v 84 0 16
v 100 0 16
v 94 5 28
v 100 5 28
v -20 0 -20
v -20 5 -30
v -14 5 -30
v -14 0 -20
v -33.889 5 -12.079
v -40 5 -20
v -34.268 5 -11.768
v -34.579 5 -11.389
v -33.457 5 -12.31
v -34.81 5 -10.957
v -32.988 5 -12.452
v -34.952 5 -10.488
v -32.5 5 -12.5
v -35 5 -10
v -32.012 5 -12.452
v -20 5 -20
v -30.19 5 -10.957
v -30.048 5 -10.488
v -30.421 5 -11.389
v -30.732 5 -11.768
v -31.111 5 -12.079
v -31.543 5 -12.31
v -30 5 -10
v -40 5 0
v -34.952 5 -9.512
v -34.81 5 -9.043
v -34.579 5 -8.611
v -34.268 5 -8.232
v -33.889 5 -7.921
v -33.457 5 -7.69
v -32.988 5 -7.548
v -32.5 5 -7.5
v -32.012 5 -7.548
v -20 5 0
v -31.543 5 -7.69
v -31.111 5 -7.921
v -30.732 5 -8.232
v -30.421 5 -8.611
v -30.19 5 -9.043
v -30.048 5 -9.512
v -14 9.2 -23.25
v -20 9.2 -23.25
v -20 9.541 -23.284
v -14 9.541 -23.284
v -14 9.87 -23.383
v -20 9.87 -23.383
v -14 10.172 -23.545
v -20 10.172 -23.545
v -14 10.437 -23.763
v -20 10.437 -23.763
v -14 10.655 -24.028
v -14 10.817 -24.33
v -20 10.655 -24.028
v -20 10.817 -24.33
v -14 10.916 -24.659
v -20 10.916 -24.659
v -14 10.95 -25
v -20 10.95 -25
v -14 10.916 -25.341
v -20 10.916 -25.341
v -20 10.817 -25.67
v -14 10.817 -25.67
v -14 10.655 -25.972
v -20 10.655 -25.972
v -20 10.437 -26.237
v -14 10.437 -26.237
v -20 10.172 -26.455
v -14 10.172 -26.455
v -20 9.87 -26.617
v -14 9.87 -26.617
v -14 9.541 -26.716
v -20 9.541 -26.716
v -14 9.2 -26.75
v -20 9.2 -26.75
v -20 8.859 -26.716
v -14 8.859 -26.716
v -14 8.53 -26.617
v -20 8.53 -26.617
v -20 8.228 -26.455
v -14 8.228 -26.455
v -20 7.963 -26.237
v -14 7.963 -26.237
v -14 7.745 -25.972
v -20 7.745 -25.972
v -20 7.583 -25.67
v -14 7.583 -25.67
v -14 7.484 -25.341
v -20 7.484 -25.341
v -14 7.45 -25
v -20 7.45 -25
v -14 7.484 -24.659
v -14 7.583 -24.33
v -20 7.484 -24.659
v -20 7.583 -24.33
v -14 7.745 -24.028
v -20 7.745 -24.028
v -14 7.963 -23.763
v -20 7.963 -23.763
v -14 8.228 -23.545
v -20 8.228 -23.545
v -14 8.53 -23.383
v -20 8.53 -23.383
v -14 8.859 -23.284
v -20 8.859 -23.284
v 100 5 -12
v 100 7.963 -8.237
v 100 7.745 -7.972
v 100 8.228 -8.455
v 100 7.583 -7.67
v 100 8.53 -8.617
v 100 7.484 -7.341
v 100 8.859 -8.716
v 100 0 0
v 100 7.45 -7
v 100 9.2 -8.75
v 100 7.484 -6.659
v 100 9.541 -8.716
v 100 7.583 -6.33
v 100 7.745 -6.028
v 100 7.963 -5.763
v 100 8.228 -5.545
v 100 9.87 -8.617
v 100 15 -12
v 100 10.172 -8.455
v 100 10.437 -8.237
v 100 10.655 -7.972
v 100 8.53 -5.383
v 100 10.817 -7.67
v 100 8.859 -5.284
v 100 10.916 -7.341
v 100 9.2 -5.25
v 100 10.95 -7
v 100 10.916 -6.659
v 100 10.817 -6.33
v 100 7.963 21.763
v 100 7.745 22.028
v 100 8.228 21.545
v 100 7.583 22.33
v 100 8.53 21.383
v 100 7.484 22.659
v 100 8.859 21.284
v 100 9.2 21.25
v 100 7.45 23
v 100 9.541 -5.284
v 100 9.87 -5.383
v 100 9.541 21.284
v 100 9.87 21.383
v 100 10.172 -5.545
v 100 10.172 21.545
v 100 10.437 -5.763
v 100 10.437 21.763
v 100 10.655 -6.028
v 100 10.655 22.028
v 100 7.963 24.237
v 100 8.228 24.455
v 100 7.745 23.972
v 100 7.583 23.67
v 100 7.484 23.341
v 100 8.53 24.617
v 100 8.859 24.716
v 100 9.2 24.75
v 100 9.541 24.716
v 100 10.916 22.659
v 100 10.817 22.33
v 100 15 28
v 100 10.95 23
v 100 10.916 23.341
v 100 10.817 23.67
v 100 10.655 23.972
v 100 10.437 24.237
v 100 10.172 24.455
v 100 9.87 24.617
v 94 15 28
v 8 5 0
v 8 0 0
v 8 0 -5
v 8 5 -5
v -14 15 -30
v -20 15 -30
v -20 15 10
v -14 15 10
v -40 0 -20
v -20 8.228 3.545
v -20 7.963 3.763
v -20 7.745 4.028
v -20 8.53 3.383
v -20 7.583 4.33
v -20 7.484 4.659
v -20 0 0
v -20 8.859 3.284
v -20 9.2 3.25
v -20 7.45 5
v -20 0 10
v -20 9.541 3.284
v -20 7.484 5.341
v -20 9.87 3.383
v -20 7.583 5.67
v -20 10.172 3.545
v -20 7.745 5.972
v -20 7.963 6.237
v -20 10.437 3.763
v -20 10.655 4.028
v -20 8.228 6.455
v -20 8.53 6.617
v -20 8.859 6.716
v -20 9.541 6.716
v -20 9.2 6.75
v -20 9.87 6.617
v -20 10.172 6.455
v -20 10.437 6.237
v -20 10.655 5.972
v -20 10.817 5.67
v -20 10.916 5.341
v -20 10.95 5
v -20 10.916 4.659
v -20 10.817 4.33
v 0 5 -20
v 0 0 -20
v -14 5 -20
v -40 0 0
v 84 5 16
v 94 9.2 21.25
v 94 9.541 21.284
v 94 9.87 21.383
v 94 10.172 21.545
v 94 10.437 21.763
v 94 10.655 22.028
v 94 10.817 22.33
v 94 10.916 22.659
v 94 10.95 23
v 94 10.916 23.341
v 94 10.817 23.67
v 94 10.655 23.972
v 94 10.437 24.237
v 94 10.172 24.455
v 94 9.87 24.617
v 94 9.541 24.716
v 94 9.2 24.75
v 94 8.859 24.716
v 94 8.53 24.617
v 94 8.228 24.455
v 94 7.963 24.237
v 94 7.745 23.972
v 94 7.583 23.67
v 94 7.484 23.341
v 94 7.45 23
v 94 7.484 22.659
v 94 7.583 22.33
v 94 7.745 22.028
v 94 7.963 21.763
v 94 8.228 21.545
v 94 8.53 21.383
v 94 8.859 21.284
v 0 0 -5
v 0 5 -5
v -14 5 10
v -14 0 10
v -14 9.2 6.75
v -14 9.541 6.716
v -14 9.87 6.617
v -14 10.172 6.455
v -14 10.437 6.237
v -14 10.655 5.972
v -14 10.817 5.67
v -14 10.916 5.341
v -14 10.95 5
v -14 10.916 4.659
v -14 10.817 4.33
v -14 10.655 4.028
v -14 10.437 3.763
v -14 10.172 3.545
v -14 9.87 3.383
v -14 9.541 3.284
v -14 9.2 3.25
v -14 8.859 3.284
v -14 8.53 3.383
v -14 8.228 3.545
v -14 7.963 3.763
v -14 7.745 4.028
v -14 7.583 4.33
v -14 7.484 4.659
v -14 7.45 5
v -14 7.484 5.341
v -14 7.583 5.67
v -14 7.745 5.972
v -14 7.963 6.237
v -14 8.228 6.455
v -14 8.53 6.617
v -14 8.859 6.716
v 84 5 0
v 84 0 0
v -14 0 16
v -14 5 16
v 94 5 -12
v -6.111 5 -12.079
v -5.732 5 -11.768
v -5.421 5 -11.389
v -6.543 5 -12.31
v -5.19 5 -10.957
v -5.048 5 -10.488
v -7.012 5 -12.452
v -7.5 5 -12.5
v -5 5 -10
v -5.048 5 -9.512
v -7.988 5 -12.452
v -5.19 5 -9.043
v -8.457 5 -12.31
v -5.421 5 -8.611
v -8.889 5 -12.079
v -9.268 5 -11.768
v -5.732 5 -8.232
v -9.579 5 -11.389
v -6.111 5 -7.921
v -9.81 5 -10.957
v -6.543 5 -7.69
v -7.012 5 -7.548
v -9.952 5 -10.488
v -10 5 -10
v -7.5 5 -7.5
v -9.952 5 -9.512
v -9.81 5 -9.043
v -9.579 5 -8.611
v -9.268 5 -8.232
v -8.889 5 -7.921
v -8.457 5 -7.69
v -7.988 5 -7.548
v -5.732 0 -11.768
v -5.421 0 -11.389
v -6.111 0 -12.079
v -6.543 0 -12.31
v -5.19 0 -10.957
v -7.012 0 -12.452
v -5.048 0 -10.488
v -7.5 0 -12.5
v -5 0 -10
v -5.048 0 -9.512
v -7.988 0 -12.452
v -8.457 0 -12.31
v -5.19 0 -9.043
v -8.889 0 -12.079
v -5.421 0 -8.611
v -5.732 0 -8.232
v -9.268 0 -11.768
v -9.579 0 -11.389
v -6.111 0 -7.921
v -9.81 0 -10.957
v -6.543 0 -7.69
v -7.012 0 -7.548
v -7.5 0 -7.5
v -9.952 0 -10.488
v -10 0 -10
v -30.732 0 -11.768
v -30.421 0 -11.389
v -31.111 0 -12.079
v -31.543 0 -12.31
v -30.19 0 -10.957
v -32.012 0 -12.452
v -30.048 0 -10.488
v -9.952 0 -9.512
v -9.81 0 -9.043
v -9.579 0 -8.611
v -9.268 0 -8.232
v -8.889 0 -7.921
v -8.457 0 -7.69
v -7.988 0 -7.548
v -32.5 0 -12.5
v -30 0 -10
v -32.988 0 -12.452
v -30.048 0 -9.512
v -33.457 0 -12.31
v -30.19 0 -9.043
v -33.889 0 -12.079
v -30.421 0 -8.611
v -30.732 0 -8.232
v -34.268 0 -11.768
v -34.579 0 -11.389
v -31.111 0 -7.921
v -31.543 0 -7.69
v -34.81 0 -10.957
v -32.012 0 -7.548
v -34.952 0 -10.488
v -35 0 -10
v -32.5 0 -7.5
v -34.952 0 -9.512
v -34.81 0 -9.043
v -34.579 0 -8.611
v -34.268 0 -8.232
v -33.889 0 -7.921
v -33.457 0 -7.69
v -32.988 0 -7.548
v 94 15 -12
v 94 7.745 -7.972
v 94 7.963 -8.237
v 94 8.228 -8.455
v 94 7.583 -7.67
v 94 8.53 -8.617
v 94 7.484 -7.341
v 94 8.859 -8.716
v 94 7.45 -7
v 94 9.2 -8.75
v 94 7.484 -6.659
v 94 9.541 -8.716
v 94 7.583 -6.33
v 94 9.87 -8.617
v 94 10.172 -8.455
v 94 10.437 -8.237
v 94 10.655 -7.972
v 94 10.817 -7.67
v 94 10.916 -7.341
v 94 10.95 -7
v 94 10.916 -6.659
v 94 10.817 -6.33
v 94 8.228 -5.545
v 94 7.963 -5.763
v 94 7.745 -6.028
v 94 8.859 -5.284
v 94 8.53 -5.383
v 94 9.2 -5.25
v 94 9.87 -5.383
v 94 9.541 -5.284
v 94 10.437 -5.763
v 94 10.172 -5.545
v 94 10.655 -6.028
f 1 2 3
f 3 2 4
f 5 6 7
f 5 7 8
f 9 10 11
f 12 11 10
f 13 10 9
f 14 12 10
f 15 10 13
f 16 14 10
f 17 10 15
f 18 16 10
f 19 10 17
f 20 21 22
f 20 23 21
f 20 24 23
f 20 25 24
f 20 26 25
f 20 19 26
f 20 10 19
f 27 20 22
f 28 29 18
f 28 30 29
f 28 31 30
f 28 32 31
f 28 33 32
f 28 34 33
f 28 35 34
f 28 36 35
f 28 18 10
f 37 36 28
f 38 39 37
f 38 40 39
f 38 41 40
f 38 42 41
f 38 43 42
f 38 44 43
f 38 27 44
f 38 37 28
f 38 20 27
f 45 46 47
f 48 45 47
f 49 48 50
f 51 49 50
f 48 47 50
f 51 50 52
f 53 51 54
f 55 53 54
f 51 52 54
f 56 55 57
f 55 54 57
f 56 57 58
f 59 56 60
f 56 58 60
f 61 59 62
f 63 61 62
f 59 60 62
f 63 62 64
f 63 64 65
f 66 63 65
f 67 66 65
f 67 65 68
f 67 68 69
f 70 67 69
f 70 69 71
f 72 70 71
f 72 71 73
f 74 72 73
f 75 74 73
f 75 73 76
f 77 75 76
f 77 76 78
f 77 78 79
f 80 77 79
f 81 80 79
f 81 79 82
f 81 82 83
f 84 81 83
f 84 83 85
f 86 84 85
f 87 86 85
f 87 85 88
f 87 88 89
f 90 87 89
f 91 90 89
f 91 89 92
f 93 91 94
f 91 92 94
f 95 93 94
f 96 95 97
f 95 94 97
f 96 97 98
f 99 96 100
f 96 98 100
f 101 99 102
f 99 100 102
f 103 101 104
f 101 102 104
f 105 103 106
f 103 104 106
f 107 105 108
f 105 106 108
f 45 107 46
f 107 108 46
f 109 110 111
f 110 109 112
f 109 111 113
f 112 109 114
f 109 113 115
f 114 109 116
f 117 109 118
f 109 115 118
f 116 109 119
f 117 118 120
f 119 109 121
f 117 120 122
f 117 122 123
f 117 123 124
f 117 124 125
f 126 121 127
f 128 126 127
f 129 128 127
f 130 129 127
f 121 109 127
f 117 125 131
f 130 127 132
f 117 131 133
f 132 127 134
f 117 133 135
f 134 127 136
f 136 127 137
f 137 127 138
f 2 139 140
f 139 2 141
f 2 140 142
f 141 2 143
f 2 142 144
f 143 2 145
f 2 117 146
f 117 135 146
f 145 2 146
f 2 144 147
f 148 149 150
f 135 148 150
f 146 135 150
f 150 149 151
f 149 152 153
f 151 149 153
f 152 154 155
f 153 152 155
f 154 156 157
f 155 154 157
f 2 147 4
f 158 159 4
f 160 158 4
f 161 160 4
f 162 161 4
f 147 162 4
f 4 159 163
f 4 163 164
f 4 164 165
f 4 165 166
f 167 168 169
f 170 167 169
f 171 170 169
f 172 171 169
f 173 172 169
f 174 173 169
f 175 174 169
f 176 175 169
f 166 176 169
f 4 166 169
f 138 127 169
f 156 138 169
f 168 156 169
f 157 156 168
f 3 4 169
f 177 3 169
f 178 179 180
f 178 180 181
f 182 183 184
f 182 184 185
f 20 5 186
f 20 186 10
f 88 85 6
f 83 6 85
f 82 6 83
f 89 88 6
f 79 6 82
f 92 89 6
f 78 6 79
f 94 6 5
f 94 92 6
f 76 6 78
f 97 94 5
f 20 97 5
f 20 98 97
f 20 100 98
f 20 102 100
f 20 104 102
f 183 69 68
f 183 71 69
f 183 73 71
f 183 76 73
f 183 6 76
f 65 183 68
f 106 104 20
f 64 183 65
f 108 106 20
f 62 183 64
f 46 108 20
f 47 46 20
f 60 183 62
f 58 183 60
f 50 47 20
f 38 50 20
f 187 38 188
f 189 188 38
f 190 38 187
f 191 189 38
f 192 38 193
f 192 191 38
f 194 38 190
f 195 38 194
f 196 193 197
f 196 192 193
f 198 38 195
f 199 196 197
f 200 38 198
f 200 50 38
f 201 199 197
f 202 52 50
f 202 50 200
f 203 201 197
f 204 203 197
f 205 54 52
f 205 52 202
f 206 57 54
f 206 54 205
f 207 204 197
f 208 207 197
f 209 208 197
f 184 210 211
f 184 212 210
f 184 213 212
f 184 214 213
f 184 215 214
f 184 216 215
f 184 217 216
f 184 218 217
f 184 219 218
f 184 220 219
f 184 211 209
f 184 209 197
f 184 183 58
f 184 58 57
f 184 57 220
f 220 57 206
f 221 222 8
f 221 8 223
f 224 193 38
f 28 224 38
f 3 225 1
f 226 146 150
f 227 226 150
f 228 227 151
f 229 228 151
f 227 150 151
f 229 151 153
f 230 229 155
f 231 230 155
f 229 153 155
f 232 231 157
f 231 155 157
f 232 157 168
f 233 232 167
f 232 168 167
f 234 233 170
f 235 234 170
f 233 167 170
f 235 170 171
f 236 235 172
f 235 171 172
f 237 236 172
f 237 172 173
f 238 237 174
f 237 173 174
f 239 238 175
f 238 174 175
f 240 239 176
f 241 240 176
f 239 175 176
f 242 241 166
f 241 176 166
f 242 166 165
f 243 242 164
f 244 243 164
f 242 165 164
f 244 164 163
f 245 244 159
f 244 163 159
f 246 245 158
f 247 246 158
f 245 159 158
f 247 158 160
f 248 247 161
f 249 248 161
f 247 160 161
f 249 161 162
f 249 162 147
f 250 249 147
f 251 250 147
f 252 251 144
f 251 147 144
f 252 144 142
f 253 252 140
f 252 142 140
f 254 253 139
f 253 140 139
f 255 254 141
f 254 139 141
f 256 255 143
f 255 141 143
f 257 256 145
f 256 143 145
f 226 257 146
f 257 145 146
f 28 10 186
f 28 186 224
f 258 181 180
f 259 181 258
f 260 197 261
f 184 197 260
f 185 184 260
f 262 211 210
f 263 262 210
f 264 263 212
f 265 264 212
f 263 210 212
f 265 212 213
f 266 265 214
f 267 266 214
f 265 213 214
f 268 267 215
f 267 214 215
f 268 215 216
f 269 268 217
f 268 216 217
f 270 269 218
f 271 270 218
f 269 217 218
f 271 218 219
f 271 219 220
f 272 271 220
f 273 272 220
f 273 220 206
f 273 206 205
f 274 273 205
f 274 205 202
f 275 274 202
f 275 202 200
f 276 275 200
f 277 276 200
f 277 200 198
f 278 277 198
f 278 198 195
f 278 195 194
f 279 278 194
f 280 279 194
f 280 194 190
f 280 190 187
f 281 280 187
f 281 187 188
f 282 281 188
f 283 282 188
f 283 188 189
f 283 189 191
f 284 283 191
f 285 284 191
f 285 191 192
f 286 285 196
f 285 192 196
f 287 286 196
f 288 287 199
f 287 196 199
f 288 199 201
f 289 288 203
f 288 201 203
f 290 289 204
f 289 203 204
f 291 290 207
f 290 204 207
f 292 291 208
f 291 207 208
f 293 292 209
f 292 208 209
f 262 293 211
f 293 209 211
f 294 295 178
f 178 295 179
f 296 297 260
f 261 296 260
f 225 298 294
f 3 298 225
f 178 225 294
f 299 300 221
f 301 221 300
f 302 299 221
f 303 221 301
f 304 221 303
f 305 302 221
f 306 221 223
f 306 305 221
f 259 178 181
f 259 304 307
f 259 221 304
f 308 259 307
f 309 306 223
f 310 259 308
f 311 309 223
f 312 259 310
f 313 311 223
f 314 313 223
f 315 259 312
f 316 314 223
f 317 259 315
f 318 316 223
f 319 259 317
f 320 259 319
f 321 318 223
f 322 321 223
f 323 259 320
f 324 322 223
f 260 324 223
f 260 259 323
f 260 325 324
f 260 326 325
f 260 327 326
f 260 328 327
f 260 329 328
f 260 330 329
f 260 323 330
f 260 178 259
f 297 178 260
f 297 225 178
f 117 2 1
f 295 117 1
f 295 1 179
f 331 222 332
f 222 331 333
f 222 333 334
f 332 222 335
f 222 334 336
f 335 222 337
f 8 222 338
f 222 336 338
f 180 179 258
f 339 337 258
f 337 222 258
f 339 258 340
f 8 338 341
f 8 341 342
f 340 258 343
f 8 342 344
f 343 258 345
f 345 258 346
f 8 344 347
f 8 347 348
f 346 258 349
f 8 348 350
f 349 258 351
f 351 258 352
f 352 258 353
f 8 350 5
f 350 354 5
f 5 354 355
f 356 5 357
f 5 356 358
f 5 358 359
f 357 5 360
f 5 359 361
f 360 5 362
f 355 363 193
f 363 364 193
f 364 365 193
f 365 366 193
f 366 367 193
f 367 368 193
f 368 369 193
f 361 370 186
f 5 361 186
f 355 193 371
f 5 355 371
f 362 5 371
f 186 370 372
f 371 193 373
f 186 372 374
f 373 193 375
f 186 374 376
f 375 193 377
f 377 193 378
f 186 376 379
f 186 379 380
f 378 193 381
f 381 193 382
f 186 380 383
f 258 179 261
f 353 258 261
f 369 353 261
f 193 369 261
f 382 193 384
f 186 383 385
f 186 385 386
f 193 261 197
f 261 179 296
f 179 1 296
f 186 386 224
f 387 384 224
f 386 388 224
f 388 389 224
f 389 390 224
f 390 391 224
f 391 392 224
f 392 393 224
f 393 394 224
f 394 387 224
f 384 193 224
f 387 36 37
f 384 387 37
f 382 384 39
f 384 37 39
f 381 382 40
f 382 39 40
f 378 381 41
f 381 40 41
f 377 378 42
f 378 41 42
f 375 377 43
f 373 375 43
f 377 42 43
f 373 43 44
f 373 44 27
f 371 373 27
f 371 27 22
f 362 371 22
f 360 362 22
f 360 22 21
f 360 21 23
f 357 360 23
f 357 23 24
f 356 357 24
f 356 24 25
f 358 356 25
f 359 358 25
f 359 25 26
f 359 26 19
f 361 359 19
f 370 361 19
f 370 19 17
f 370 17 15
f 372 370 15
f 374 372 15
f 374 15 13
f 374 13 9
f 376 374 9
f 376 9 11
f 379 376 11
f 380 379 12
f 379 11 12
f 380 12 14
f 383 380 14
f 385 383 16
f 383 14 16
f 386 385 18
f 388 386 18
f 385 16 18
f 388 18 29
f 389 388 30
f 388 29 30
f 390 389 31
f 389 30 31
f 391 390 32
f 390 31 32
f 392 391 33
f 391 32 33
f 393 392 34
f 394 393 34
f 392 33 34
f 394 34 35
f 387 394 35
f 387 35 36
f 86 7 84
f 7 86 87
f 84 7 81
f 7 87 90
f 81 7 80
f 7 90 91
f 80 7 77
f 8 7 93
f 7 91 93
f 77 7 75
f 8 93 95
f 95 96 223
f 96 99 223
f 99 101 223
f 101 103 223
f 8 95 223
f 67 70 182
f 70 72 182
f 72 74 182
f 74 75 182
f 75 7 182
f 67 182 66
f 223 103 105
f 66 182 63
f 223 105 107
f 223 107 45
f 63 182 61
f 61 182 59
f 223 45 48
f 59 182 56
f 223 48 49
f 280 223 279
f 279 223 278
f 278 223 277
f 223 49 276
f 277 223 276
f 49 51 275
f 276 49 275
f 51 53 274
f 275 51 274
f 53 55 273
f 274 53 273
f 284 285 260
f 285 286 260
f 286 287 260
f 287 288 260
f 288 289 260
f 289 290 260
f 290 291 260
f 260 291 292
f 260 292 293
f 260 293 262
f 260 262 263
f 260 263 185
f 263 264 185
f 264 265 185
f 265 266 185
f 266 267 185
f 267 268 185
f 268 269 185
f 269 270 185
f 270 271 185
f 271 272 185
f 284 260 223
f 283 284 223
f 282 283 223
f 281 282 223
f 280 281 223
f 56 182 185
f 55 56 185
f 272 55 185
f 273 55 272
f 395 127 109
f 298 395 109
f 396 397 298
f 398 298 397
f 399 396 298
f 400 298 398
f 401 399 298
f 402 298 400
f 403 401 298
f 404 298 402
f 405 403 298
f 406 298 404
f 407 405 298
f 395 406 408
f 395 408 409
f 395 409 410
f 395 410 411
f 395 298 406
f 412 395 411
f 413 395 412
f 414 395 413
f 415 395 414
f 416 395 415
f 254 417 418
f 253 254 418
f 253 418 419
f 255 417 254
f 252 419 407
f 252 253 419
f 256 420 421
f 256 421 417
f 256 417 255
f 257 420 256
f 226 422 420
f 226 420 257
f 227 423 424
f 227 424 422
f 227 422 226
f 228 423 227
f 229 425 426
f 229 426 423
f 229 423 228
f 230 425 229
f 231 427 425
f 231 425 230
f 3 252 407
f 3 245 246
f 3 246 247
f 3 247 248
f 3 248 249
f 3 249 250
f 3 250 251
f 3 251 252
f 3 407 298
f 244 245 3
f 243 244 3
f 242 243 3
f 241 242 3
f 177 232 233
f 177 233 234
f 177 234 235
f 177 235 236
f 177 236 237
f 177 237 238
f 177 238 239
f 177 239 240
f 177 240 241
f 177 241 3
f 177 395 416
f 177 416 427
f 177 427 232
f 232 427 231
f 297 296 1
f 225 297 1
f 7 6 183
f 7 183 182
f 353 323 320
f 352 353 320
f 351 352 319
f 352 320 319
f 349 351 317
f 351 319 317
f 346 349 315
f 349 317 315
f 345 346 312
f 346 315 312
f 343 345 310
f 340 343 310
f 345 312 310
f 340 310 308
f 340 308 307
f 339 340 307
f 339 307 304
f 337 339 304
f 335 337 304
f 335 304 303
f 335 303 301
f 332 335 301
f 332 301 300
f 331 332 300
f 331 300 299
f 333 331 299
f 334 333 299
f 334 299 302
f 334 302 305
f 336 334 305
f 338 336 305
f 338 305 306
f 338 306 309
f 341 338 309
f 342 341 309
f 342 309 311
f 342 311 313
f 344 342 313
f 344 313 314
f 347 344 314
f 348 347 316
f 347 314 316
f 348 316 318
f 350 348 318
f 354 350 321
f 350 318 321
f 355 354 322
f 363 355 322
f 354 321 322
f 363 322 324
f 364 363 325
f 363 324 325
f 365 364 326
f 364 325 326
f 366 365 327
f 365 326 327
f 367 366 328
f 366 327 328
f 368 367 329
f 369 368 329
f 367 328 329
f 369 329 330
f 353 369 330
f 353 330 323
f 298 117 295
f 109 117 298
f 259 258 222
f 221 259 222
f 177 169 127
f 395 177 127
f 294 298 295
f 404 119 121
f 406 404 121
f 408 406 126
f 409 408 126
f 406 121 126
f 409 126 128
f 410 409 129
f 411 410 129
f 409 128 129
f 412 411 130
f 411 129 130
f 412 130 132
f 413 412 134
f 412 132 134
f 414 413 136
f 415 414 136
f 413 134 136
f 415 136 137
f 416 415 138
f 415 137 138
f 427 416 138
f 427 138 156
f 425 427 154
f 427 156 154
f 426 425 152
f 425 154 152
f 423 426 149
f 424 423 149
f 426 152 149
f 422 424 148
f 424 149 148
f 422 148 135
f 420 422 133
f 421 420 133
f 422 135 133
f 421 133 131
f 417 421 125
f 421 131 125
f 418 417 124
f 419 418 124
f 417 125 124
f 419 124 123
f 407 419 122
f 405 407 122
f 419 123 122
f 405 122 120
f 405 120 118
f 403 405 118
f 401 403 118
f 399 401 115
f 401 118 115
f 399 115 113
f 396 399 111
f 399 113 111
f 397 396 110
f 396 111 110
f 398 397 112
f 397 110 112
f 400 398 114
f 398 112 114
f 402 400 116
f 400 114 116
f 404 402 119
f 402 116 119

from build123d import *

# Parameters (mm, degrees)
EXTRUDE_1_DEPTH     = 5
SKETCH_2_R          = 1.75
EXTRUDE_2_DEPTH     = 6
SKETCH_3_W          = 20
SKETCH_3_H          = 5
EXTRUDE_3_DEPTH     = 20
SKETCH_4_R          = 2.5
CUT_EXTRUDE_1_DEPTH = 105.326410846
SKETCH_5_W          = 6
SKETCH_5_H          = 40
EXTRUDE_4_DEPTH     = 10
EXTRUDE_5_DEPTH     = 6
CUT_EXTRUDE_2_REACH = 126.599
SKETCH_8_R          = 1.75
EXTRUDE_6_DEPTH     = 10
CUT_EXTRUDE_3_REACH = 106.109
CUT_EXTRUDE_4_REACH = 117.472
SKETCH_16_W         = 6
SKETCH_16_H         = 6
CUT_EXTRUDE_5_DEPTH = 10
SKETCH_17_W         = 8
SKETCH_17_H         = 5
EXTRUDE_7_DEPTH     = 5


with BuildPart() as part:
    # 草图1 → 凸台-拉伸1 (new body)
    with BuildSketch(Plane(origin=(0, 0, 0), x_dir=(1, 0, 0), z_dir=(0, 1, 0))):
        Polygon((0, 0), (0, 20), (-20, 20), (-20, -16), (100, -16), (100, 0), align=None)
    extrude(amount=EXTRUDE_1_DEPTH)

    # 草图2 → 凸台-拉伸2 (add)
    with BuildSketch(Plane(origin=(100, 0, 0), x_dir=(0, 0, -1), z_dir=(1, 0, 0))):
        Polygon((-16, 0), (-28, 5), (-28, 15), (12, 15), (12, 5), (0, 0), align=None)
        with Locations((-23, 9.2)):
            Circle(SKETCH_2_R, mode=Mode.SUBTRACT)
        with Locations((7, 9.2)):
            Circle(SKETCH_2_R, mode=Mode.SUBTRACT)
    extrude(amount=-EXTRUDE_2_DEPTH)

    # 草图3 → 凸台-拉伸3 (add)
    with BuildSketch(Plane.ZY.offset(20)):
        with Locations((-10, 2.5)):
            Rectangle(SKETCH_3_W, SKETCH_3_H)
    extrude(amount=EXTRUDE_3_DEPTH)

    # 草图4 → 切除-拉伸1 (cut, through all)
    with BuildSketch(Plane(origin=(0, 5, 0), x_dir=(1, 0, 0), z_dir=(0, 1, 0))):
        with Locations(Location((-32.5, 10, 0), (0, 0, 270))):
            Circle(SKETCH_4_R)
        with Locations(Location((-7.5, 10, 0), (0, 0, 270))):
            Circle(SKETCH_4_R)
    extrude(amount=-CUT_EXTRUDE_1_DEPTH, mode=Mode.SUBTRACT)

    # 草图5 → 凸台-拉伸4 (add)
    with BuildSketch(Plane(origin=(0, 5, 0), x_dir=(1, 0, 0), z_dir=(0, 1, 0))):
        with Locations((-17, 10)):
            Rectangle(SKETCH_5_W, SKETCH_5_H)
    extrude(amount=EXTRUDE_4_DEPTH)

    # 草图7 → 凸台-拉伸5 (add)
    with BuildSketch(Plane.ZY.offset(20)):
        Polygon((-30, 5), (-20, 0), (-20, 5), align=None)
    extrude(amount=-EXTRUDE_5_DEPTH)

    # 草图8 → 切除-拉伸2 (cut, up to next)
    with BuildSketch(Plane.ZY.offset(20), mode=Mode.PRIVATE) as cut_extrude_2_sk1:
        with Locations((-25, 9.2)):
            Circle(SKETCH_8_R)
    cut_extrude_2_tool1 = extrude(cut_extrude_2_sk1.sketch, amount=-CUT_EXTRUDE_2_REACH, mode=Mode.PRIVATE) & part.part
    # 草图8 → 切除-拉伸2 (cut, up to next)
    with BuildSketch(Plane.ZY.offset(20), mode=Mode.PRIVATE) as cut_extrude_2_sk2:
        with Locations((5, 9.2)):
            Circle(SKETCH_8_R)
    cut_extrude_2_tool2 = extrude(cut_extrude_2_sk2.sketch, amount=-CUT_EXTRUDE_2_REACH, mode=Mode.PRIVATE) & part.part
    add(cut_extrude_2_tool1.solids().sort_by_distance((-20, 9.2, -25))[0], mode=Mode.SUBTRACT)
    add(cut_extrude_2_tool2.solids().sort_by_distance((-20, 9.2, 5))[0], mode=Mode.SUBTRACT)

    # 草图13 → 凸台-拉伸6 (add)
    with BuildSketch(Plane.ZY.offset(-94)):
        Polygon((-12, 5), (28, 5), (16, 0), (0, 0), align=None)
    extrude(amount=EXTRUDE_6_DEPTH)

    # 草图14 → 切除-拉伸3 (cut, up to next)
    with BuildSketch(Plane(origin=(41.704918033, 0, -34.754098361), x_dir=(-0.6401843996644796, 0, -0.7682212795973761), z_dir=(0.7682212795973761, 0, -0.6401843996644796)), mode=Mode.PRIVATE) as cut_extrude_3_sk1:
        Polygon((-66.067030045, 5), (-66.067030045, 0), (-81.687529397, 5), align=None)
    cut_extrude_3_tool1 = extrude(cut_extrude_3_sk1.sketch, amount=-CUT_EXTRUDE_3_REACH, mode=Mode.PRIVATE) & part.part
    add(cut_extrude_3_tool1.solids().sort_by_distance((87.333333, 3.333333, 20))[0], mode=Mode.SUBTRACT)

    # 草图15 → 切除-拉伸4 (cut, up to next)
    with BuildSketch(Plane(origin=(49.573770492, 0, 41.31147541), x_dir=(0.6401843996644798, 0, -0.768221279597376), z_dir=(0.768221279597376, 0, 0.6401843996644798)), mode=Mode.PRIVATE) as cut_extrude_4_sk1:
        Polygon((69.395988924, 5), (53.775489572, 0), (53.775489572, 5), align=None)
    cut_extrude_4_tool1 = extrude(cut_extrude_4_sk1.sketch, amount=-CUT_EXTRUDE_4_REACH, mode=Mode.PRIVATE) & part.part
    add(cut_extrude_4_tool1.solids().sort_by_distance((87.333333, 3.333333, -4))[0], mode=Mode.SUBTRACT)

    # 草图16 → 切除-拉伸5 (cut)
    with BuildSketch(Plane(origin=(0, 5, 0), x_dir=(1, 0, 0), z_dir=(0, 1, 0))):
        with Locations((-17, -13)):
            Rectangle(SKETCH_16_W, SKETCH_16_H)
    extrude(amount=-CUT_EXTRUDE_5_DEPTH, mode=Mode.SUBTRACT)

    # 草图17 → 凸台-拉伸7 (add)
    with BuildSketch(Plane(origin=(0, 0, 0), x_dir=(-1, 0, 0), z_dir=(0, 0, -1))):
        with Locations((-4, 2.5)):
            Rectangle(SKETCH_17_W, SKETCH_17_H)
    extrude(amount=EXTRUDE_7_DEPTH)


solid = part.part
